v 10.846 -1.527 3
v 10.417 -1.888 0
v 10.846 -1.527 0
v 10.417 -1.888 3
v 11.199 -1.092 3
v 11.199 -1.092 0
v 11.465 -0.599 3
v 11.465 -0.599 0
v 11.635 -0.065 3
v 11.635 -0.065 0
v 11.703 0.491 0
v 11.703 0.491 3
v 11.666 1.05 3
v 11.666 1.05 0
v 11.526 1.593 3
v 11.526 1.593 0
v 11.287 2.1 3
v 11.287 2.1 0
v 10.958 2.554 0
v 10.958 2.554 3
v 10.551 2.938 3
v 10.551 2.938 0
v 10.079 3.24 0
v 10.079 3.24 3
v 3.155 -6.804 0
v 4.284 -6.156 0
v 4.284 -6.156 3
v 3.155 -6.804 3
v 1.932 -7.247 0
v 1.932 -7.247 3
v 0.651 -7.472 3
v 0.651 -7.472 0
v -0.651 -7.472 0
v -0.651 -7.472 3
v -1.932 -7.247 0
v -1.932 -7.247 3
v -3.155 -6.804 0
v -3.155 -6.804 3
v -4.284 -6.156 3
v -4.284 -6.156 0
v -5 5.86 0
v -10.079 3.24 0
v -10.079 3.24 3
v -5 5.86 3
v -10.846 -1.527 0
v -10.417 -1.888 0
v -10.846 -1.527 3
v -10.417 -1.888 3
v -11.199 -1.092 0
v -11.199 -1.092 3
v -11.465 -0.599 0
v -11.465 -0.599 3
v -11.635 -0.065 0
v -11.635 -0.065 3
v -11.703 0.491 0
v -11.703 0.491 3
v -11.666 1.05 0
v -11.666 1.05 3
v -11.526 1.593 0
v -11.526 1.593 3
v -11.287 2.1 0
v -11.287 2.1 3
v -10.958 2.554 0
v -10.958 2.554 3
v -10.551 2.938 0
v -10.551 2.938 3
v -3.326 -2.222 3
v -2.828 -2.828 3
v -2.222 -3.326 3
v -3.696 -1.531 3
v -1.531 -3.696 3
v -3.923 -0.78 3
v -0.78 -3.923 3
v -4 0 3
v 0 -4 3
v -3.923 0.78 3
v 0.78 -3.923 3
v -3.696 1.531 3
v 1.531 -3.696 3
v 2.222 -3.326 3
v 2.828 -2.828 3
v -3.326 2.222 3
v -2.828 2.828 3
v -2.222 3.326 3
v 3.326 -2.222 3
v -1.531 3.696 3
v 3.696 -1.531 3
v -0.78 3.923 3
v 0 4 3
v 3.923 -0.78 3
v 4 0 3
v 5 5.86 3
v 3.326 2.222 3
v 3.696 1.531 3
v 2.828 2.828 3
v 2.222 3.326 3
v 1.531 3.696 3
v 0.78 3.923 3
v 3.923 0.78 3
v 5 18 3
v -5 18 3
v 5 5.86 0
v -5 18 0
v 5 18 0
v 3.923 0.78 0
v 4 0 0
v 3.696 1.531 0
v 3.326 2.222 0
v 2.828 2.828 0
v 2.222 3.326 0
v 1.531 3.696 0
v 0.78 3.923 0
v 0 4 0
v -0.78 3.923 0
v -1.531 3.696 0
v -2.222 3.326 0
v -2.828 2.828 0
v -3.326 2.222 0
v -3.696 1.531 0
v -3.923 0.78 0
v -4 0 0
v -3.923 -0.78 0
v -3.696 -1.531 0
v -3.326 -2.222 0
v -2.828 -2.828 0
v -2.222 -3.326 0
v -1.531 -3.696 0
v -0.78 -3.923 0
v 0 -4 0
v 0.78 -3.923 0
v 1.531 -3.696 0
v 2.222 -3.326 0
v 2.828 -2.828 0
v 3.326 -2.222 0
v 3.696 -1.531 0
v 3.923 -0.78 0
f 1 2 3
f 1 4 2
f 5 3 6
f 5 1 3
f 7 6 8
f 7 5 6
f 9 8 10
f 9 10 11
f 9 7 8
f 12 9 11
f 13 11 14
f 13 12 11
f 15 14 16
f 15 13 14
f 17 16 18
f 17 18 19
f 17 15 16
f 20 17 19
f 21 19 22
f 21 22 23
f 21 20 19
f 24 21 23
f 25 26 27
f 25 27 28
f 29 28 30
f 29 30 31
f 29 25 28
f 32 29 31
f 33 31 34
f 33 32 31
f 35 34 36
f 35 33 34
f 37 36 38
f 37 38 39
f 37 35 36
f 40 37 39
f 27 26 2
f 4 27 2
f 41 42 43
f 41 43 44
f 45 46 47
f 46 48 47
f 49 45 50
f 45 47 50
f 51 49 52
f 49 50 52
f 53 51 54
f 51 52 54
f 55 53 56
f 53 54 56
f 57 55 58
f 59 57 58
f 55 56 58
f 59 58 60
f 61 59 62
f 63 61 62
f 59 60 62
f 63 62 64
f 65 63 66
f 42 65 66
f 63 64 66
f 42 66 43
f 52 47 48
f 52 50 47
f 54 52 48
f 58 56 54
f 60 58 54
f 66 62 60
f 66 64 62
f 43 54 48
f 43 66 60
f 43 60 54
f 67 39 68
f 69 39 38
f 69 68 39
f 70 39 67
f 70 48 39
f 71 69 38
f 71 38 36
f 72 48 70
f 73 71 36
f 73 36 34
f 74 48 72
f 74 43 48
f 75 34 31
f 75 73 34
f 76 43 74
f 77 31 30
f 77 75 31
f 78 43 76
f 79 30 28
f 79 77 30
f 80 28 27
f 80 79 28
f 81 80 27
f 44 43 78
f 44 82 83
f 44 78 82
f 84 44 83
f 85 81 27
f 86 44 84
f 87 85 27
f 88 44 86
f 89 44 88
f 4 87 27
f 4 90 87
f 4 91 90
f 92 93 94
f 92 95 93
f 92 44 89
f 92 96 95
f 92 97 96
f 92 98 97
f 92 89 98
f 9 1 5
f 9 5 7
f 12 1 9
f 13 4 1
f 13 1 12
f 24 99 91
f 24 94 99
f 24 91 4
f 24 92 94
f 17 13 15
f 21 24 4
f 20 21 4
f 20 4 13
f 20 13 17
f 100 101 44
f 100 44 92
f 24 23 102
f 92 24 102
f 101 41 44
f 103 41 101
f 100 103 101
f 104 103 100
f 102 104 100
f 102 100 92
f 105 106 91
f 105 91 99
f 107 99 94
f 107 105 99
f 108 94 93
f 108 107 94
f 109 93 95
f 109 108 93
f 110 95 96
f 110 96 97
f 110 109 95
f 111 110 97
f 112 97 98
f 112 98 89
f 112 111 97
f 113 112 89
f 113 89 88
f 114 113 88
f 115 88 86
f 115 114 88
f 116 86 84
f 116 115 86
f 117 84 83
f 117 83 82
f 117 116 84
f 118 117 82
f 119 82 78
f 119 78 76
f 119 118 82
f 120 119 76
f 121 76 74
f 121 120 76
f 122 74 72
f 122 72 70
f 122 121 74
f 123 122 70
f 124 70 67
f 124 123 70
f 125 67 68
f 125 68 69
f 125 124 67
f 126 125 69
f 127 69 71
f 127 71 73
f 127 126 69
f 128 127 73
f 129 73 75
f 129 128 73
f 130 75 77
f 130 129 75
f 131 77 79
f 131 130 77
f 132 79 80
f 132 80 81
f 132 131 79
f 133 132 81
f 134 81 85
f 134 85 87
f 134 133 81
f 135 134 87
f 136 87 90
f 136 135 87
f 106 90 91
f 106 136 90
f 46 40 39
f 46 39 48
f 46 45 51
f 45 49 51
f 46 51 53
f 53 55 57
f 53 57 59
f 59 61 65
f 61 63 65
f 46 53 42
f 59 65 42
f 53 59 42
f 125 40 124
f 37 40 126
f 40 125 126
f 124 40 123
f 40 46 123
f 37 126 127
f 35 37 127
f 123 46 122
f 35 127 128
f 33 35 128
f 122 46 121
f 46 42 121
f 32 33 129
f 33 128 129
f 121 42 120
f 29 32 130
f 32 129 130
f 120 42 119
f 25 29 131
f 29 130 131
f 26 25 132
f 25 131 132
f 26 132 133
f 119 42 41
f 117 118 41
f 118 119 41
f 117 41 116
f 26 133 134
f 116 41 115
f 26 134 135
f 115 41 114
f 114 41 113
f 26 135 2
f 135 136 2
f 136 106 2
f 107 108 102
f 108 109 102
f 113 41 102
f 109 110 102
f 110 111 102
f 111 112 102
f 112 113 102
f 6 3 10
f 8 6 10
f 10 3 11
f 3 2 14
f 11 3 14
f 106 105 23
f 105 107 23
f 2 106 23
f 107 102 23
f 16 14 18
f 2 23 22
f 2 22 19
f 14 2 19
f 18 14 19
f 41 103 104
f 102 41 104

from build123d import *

# Parameters (mm, degrees)
SKETCH1_R           = 4
BOSS_EXTRUDE1_DEPTH = 3
BOSS_EXTRUDE2_DEPTH = 3
FILLET1_R           = 3


with BuildPart() as part:
    # Sketch1 → Boss-Extrude1 (new body)
    with BuildSketch(Plane.XY):
        with BuildLine():
            Line((-5, 5.590169944), (-5, 18))
            Line((-5, 18), (5, 18))
            Line((5, 18), (5, 5.590169944))
            ThreePointArc((5, 5.590169944), (0, -7.5), (-5, 5.590169944))
        make_face()
        Circle(SKETCH1_R, mode=Mode.SUBTRACT)
    extrude(amount=BOSS_EXTRUDE1_DEPTH)

    # Sketch2 → Boss-Extrude2 (add)
    with BuildSketch(Plane(origin=(0, 0, 0), x_dir=(-1, 0, 0), z_dir=(0, 0, -1))):
        with BuildLine():
            Line((-4.283653157, -6.156323223), (-14.506679921, 0.956997388))
            Line((-14.506679921, 0.956997388), (-3.437791444, 6.665702513))
            ThreePointArc((-3.437791444, 6.665702513), (-7.483733204, 0.493697605), (-4.283653157, -6.156323223))
        make_face()
        with BuildLine():
            Line((4.283653157, -6.156323223), (14.506679921, 0.956997388))
            Line((14.506679921, 0.956997388), (3.437791444, 6.665702513))
            ThreePointArc((3.437791444, 6.665702513), (7.483733204, 0.493697605), (4.283653157, -6.156323223))
        make_face()
    extrude(amount=-BOSS_EXTRUDE2_DEPTH)

    # Fillet1
    fillet1_edges = [part.edges().sort_by_distance(p)[0] for p in [
        (14.506679921, 0.956997388, 1.5),
        (-14.506679921, 0.956997388, 1.5),
    ]]
    fillet(fillet1_edges, radius=FILLET1_R)


solid = part.part
